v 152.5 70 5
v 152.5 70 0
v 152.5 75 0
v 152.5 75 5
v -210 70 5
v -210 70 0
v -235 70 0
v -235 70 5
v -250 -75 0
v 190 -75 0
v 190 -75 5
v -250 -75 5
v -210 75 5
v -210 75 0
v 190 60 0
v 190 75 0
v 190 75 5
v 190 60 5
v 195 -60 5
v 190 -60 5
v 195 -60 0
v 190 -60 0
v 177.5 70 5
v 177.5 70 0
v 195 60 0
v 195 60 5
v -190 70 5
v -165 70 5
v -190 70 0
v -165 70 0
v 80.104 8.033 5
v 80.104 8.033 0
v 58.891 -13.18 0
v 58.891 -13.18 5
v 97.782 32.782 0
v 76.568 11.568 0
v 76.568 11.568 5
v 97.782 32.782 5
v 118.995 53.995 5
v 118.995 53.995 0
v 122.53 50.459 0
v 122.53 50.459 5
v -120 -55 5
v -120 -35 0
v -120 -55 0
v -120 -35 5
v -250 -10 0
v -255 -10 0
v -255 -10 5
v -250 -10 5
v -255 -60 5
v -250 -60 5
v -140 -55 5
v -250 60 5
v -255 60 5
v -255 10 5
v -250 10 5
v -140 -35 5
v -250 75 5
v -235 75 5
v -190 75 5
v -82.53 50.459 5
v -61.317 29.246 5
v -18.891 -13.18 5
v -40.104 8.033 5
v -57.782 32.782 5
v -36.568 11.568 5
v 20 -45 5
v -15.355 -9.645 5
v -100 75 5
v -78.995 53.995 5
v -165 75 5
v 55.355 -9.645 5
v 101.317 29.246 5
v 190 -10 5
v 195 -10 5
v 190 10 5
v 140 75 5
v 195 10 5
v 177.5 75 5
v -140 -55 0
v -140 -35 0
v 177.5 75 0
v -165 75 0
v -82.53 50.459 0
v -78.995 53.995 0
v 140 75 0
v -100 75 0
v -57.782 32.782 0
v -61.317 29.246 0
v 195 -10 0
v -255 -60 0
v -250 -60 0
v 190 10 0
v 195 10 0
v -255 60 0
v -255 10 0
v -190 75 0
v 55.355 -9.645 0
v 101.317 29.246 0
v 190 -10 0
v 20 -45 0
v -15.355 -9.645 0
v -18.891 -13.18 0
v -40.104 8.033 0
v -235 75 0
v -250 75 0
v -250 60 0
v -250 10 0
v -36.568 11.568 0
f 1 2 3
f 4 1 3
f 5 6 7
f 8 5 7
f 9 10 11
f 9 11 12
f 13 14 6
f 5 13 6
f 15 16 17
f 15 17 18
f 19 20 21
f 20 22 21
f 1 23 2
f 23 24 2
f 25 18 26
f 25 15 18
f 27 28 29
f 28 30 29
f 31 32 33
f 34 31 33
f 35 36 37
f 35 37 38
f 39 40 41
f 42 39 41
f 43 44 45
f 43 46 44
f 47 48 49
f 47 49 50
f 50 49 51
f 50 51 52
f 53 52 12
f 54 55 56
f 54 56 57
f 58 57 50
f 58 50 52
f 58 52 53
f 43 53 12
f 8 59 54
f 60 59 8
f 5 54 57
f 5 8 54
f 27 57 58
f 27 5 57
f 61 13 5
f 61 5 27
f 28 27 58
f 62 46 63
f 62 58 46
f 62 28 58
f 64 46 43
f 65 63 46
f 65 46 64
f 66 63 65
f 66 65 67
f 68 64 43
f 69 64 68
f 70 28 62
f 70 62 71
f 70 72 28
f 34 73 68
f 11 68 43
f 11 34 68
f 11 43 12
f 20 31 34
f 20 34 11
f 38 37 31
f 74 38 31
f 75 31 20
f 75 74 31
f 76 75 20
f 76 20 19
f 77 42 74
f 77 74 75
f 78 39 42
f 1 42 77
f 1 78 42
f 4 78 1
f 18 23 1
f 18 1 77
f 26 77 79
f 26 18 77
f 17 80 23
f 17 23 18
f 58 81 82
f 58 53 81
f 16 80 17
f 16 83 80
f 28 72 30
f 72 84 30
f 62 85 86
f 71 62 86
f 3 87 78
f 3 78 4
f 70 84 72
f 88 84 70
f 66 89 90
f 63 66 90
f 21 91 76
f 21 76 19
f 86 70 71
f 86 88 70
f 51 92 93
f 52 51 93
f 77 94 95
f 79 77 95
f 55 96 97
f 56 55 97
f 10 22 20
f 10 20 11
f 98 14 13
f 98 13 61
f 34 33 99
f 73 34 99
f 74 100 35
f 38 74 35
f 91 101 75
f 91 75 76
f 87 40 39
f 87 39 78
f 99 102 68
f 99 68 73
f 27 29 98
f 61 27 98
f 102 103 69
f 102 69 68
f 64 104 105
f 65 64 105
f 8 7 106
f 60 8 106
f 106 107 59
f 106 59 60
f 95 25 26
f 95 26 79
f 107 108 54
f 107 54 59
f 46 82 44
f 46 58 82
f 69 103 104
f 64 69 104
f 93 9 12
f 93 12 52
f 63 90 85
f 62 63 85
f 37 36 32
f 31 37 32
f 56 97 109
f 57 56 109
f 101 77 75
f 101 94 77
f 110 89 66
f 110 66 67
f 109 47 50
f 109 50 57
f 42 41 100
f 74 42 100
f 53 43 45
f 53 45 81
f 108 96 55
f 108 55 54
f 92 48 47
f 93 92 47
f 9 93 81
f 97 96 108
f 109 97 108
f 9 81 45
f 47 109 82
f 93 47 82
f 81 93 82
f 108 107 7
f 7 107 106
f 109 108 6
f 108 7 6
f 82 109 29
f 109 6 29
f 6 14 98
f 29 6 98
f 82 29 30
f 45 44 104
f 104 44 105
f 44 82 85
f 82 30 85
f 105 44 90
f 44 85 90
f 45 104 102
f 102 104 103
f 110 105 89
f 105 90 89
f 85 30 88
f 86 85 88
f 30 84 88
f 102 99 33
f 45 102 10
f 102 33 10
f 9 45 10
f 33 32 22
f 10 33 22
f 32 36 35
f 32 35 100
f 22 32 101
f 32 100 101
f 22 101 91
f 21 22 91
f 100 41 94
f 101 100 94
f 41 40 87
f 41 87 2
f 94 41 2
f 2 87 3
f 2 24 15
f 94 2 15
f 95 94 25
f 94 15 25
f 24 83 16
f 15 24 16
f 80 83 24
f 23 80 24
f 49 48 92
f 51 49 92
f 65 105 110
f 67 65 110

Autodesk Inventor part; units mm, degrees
ref_plane "YZ Plane" through (0, 0, 0) normal (1, 0, 0) x (0, 1, 0)
ref_plane "XZ Plane" through (0, 0, 0) normal (0, 1, 0) x (-1, 0, 0)
ref_plane "XY Plane" through (0, 0, 0) normal (0, 0, 1) x (1, 0, 0)
sketch "Sketch1" plane through (0, 0, 0) normal (0, 0, 1) x (1, 0, 0)
  line L0 (190, -75) -> (-250, -75) projected
  line L1 (190, 75) -> (190, -75) projected
  line L2 (-250, 75) -> (-235, 75) projected
  line L3 (-250, -75) -> (-250, 75) projected
  line L4 (-255, -10) -> (-255, -60) projected
  line L5 (-255, -60) -> (-250, -60) projected
  line L6 (-250, -10) -> (-250, -60) projected
  line L7 (-255, -10) -> (-250, -10) projected
  line L8 (-255, 60) -> (-255, 10) projected
  line L9 (-255, 10) -> (-250, 10) projected
  line L10 (-250, 60) -> (-250, 10) projected
  line L11 (-255, 60) -> (-250, 60) projected
  line L12 (190, 60) -> (190, 10) projected
  line L13 (190, 10) -> (195, 10) projected
  line L14 (195, 60) -> (195, 10) projected
  line L15 (190, 60) -> (195, 60) projected
  line L16 (190, -10) -> (190, -60) projected
  line L17 (190, -60) -> (195, -60) projected
  line L18 (195, -10) -> (195, -60) projected
  line L19 (190, -10) -> (195, -10) projected
  line L20 (140, 75) -> (152.5, 75) projected
  line L21 (20, -45) -> (55.3553, -9.6447) projected
  line L22 (-100, 75) -> (-78.9949, 53.9949) projected
  line L23 (-15.3553, -9.6447) -> (-18.8909, -13.1802) projected
  line L24 (-18.8909, -13.1802) -> (-40.1041, 8.033) projected
  line L25 (-40.1041, 8.033) -> (-36.5685, 11.5685) projected
  line L26 (-57.7817, 32.7817) -> (-36.5685, 11.5685) projected
  line L27 (-57.7817, 32.7817) -> (-61.3173, 29.2462) projected
  line L28 (-61.3173, 29.2462) -> (-82.5305, 50.4594) projected
  line L29 (-82.5305, 50.4594) -> (-78.9949, 53.9949) projected
  line L30 (118.9949, 53.9949) -> (140, 75) projected
  line L31 (118.9949, 53.9949) -> (122.5305, 50.4594) projected
  line L32 (122.5305, 50.4594) -> (101.3173, 29.2462) projected
  line L33 (101.3173, 29.2462) -> (97.7817, 32.7817) projected
  line L34 (76.5685, 11.5685) -> (97.7817, 32.7817) projected
  line L35 (76.5685, 11.5685) -> (80.1041, 8.033) projected
  line L36 (80.1041, 8.033) -> (58.8909, -13.1802) projected
  line L37 (58.8909, -13.1802) -> (55.3553, -9.6447) projected
  line L38 (-15.3553, -9.6447) -> (20, -45) projected
  line L39 (-210, 75) -> (-210, 70) projected
  line L40 (-210, 70) -> (-235, 70) projected
  line L41 (-235, 70) -> (-235, 75) projected
  line L42 (177.5, 75) -> (190, 75) projected
  line L43 (177.5, 75) -> (177.5, 70) projected
  line L44 (177.5, 70) -> (152.5, 70) projected
  line L45 (152.5, 70) -> (152.5, 75) projected
  line L46 (-165, 75) -> (-100, 75) projected
  line L47 (-165, 75) -> (-165, 70) projected
  line L48 (-165, 70) -> (-190, 70) projected
  line L49 (-190, 70) -> (-190, 75) projected
  line L50 (-210, 75) -> (-190, 75) projected
  point P0 (0, 0)
extrude "Extrusion1" add sketch "Sketch1" along normal blind 5
sketch "Sketch2" plane through (0, 0, 5) normal (0, 0, 1) x (1, 0, 0)
  point P0 (0, 0)
sketch "Sketch4" plane through (0, 0, 5) normal (0, 0, 1) x (1, 0, 0)
  line L0 (190, -60) -> (195, -60) projected
  line L1 (195, -60) -> (195, -10) projected
  line L2 (195, -10) -> (190, -10) projected
  line L3 (190, -10) -> (190, 10) projected
  line L4 (190, 10) -> (195, 10) projected
  line L5 (195, 10) -> (195, 60) projected
  line L6 (195, 60) -> (190, 60) projected
  line L7 (190, 60) -> (190, 75) projected
  line L8 (190, 75) -> (177.5, 75) projected
  line L9 (177.5, 75) -> (177.5, 70) projected
  line L10 (177.5, 70) -> (152.5, 70) projected
  line L11 (152.5, 70) -> (152.5, 75) projected
  line L12 (152.5, 75) -> (140, 75) projected
  line L13 (140, 75) -> (118.9949, 53.9949) projected
  line L14 (118.9949, 53.9949) -> (122.5305, 50.4594) projected
  line L15 (122.5305, 50.4594) -> (101.3173, 29.2462) projected
  line L16 (101.3173, 29.2462) -> (97.7817, 32.7817) projected
  line L17 (97.7817, 32.7817) -> (76.5685, 11.5685) projected
  line L18 (76.5685, 11.5685) -> (80.1041, 8.033) projected
  line L19 (80.1041, 8.033) -> (58.8909, -13.1802) projected
  line L20 (58.8909, -13.1802) -> (55.3553, -9.6447) projected
  line L21 (55.3553, -9.6447) -> (20, -45) projected
  line L22 (20, -45) -> (-15.3553, -9.6447) projected
  line L23 (-15.3553, -9.6447) -> (-18.8909, -13.1802) projected
  line L24 (-18.8909, -13.1802) -> (-40.1041, 8.033) projected
  line L25 (-40.1041, 8.033) -> (-36.5685, 11.5685) projected
  line L26 (-36.5685, 11.5685) -> (-57.7817, 32.7817) projected
  line L27 (-57.7817, 32.7817) -> (-61.3173, 29.2462) projected
  line L28 (-61.3173, 29.2462) -> (-82.5305, 50.4594) projected
  line L29 (-82.5305, 50.4594) -> (-78.9949, 53.9949) projected
  line L30 (-78.9949, 53.9949) -> (-100, 75) projected
  line L31 (-100, 75) -> (-165, 75) projected
  line L32 (-165, 75) -> (-165, 70) projected
  line L33 (-165, 70) -> (-190, 70) projected
  line L34 (-190, 70) -> (-190, 75) projected
  line L35 (-190, 75) -> (-210, 75) projected
  line L36 (-210, 75) -> (-210, 70) projected
  line L37 (-210, 70) -> (-235, 70) projected
  line L38 (-235, 70) -> (-235, 75) projected
  line L39 (-235, 75) -> (-250, 75) projected
  line L40 (-250, 75) -> (-250, 60) projected
  line L41 (-250, 60) -> (-255, 60) projected
  line L42 (-255, 60) -> (-255, 10) projected
  line L43 (-255, 10) -> (-250, 10) projected
  line L44 (-250, 10) -> (-250, -10) projected
  line L45 (-250, -10) -> (-255, -10) projected
  line L46 (-255, -10) -> (-255, -60) projected
  line L47 (-255, -60) -> (-250, -60) projected
  line L48 (-250, -60) -> (-250, -75) projected
  line L49 (-250, -75) -> (190, -75) projected
  line L50 (190, -75) -> (190, -60) projected
  line L51 (-140, -35) -> (-120, -35)
  line L52 (-120, -35) -> (-120, -55)
  line L53 (-120, -55) -> (-140, -55)
  line L54 (-140, -55) -> (-140, -35)
  point P0 (0, 0)
  dimension "d4" = 20
  dimension "d5" = 20
  dimension "d6" = 20
  dimension "d7" = 110
extrude "Extrusion3" cut sketch "Sketch4" against normal blind 10 contours L51 L52 L53 L54
properties part number "Fondo"
